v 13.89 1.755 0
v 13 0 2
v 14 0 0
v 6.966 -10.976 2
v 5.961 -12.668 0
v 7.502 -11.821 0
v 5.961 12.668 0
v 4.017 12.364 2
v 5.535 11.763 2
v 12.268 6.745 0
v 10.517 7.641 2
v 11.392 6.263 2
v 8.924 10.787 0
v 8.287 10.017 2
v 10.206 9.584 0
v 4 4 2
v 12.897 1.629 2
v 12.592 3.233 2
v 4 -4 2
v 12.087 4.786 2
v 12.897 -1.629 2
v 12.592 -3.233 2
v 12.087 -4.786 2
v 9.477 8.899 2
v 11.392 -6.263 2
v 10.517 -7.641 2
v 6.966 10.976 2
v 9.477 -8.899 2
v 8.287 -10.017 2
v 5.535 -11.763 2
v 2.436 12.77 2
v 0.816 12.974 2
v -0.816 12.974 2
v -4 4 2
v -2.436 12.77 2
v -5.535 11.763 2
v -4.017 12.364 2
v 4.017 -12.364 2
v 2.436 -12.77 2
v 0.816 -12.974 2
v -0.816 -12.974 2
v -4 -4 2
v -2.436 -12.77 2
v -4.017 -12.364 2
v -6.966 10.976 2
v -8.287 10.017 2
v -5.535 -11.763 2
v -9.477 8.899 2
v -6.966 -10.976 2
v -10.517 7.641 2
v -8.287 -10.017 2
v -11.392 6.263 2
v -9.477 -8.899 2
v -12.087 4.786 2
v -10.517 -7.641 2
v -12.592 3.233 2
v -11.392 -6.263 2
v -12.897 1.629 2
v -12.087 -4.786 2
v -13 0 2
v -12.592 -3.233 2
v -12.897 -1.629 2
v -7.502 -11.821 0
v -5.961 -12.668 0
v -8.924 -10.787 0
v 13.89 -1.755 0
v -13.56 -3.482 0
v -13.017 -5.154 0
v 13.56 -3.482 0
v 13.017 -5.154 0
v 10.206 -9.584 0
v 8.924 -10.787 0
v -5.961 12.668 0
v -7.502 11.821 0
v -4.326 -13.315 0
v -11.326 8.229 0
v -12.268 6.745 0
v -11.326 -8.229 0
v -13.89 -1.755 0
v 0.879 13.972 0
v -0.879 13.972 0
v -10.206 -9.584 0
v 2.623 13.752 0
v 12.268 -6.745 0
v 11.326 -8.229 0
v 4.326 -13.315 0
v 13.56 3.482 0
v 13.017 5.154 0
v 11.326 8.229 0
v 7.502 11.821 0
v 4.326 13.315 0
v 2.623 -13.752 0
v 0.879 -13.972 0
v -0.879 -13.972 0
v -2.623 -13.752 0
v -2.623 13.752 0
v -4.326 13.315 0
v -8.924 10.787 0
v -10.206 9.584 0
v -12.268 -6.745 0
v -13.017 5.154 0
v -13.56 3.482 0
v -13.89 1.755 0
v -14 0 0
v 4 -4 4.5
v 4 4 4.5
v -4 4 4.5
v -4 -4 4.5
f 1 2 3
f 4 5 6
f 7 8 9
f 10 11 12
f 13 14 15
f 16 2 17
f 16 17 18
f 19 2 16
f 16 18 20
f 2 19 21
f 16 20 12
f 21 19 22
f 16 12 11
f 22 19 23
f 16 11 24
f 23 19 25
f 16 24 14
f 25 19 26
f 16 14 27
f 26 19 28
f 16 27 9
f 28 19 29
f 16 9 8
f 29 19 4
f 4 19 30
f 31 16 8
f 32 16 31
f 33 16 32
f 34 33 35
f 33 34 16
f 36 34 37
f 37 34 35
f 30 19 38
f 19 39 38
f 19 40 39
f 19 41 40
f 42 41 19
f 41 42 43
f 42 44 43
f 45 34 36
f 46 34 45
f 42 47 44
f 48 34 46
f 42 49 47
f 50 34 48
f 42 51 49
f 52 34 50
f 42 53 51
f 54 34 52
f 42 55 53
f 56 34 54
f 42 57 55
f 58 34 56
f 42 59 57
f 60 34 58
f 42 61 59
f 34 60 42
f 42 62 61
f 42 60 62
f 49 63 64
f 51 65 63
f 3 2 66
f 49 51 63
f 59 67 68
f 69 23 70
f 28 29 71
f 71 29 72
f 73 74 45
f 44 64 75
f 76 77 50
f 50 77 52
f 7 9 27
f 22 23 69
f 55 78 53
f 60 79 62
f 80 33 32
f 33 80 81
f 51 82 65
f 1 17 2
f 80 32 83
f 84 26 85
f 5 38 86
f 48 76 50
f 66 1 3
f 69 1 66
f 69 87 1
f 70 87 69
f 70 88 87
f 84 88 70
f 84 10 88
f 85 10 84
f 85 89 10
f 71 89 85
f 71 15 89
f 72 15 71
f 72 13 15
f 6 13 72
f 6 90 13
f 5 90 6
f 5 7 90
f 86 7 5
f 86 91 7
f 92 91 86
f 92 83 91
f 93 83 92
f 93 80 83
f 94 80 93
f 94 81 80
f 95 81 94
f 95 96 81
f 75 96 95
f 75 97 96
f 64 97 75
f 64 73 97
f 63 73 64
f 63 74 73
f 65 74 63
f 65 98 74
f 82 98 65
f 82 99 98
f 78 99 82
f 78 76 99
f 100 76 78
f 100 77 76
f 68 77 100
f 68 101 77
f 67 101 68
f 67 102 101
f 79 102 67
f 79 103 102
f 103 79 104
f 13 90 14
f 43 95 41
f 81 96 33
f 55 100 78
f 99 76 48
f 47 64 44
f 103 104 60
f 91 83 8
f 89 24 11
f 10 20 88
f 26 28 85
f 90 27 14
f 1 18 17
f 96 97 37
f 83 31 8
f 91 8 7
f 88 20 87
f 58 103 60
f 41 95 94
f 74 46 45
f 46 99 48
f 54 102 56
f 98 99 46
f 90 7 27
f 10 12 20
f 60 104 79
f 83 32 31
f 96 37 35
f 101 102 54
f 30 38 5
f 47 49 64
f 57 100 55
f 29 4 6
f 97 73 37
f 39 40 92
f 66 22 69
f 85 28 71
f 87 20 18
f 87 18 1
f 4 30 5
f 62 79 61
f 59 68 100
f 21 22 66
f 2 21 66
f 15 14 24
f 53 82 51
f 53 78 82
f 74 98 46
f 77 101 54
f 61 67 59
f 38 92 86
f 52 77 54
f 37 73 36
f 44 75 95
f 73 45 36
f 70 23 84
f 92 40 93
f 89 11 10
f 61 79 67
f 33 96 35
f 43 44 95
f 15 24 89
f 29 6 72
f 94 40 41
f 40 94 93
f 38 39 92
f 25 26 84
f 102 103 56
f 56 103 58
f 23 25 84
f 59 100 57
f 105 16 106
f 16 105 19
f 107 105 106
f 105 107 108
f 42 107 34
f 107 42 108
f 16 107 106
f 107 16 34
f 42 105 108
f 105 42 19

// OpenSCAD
// max radius for pulley = 16
// 3mm balls, 3.5mm apart
$fn=50;
module pulley(){
difference(){
    union(){
        cylinder(r1=14,r2=13,h=2);
        cylinder(r=12.8,h=5);
    }
    
    cylinder(r=2,h=15);
    translate([-4,-4,2])cube([8,8,3]);
    for(i=[0,15,30,45,60,75,90,105,120,135,150,165,180,-15,-30,-45,-60,-75,-90,-105,-120,-135,-150,-165]){
        rotate([0,0,i])translate([13,0,2])cylinder(r=1.5,h=5);
    }
}
}

module cap(){
    cylinder(r1=14,r2=13,h=2);
    translate([-4,-4,2])cube([8,8,2.5]);
}

cap();
